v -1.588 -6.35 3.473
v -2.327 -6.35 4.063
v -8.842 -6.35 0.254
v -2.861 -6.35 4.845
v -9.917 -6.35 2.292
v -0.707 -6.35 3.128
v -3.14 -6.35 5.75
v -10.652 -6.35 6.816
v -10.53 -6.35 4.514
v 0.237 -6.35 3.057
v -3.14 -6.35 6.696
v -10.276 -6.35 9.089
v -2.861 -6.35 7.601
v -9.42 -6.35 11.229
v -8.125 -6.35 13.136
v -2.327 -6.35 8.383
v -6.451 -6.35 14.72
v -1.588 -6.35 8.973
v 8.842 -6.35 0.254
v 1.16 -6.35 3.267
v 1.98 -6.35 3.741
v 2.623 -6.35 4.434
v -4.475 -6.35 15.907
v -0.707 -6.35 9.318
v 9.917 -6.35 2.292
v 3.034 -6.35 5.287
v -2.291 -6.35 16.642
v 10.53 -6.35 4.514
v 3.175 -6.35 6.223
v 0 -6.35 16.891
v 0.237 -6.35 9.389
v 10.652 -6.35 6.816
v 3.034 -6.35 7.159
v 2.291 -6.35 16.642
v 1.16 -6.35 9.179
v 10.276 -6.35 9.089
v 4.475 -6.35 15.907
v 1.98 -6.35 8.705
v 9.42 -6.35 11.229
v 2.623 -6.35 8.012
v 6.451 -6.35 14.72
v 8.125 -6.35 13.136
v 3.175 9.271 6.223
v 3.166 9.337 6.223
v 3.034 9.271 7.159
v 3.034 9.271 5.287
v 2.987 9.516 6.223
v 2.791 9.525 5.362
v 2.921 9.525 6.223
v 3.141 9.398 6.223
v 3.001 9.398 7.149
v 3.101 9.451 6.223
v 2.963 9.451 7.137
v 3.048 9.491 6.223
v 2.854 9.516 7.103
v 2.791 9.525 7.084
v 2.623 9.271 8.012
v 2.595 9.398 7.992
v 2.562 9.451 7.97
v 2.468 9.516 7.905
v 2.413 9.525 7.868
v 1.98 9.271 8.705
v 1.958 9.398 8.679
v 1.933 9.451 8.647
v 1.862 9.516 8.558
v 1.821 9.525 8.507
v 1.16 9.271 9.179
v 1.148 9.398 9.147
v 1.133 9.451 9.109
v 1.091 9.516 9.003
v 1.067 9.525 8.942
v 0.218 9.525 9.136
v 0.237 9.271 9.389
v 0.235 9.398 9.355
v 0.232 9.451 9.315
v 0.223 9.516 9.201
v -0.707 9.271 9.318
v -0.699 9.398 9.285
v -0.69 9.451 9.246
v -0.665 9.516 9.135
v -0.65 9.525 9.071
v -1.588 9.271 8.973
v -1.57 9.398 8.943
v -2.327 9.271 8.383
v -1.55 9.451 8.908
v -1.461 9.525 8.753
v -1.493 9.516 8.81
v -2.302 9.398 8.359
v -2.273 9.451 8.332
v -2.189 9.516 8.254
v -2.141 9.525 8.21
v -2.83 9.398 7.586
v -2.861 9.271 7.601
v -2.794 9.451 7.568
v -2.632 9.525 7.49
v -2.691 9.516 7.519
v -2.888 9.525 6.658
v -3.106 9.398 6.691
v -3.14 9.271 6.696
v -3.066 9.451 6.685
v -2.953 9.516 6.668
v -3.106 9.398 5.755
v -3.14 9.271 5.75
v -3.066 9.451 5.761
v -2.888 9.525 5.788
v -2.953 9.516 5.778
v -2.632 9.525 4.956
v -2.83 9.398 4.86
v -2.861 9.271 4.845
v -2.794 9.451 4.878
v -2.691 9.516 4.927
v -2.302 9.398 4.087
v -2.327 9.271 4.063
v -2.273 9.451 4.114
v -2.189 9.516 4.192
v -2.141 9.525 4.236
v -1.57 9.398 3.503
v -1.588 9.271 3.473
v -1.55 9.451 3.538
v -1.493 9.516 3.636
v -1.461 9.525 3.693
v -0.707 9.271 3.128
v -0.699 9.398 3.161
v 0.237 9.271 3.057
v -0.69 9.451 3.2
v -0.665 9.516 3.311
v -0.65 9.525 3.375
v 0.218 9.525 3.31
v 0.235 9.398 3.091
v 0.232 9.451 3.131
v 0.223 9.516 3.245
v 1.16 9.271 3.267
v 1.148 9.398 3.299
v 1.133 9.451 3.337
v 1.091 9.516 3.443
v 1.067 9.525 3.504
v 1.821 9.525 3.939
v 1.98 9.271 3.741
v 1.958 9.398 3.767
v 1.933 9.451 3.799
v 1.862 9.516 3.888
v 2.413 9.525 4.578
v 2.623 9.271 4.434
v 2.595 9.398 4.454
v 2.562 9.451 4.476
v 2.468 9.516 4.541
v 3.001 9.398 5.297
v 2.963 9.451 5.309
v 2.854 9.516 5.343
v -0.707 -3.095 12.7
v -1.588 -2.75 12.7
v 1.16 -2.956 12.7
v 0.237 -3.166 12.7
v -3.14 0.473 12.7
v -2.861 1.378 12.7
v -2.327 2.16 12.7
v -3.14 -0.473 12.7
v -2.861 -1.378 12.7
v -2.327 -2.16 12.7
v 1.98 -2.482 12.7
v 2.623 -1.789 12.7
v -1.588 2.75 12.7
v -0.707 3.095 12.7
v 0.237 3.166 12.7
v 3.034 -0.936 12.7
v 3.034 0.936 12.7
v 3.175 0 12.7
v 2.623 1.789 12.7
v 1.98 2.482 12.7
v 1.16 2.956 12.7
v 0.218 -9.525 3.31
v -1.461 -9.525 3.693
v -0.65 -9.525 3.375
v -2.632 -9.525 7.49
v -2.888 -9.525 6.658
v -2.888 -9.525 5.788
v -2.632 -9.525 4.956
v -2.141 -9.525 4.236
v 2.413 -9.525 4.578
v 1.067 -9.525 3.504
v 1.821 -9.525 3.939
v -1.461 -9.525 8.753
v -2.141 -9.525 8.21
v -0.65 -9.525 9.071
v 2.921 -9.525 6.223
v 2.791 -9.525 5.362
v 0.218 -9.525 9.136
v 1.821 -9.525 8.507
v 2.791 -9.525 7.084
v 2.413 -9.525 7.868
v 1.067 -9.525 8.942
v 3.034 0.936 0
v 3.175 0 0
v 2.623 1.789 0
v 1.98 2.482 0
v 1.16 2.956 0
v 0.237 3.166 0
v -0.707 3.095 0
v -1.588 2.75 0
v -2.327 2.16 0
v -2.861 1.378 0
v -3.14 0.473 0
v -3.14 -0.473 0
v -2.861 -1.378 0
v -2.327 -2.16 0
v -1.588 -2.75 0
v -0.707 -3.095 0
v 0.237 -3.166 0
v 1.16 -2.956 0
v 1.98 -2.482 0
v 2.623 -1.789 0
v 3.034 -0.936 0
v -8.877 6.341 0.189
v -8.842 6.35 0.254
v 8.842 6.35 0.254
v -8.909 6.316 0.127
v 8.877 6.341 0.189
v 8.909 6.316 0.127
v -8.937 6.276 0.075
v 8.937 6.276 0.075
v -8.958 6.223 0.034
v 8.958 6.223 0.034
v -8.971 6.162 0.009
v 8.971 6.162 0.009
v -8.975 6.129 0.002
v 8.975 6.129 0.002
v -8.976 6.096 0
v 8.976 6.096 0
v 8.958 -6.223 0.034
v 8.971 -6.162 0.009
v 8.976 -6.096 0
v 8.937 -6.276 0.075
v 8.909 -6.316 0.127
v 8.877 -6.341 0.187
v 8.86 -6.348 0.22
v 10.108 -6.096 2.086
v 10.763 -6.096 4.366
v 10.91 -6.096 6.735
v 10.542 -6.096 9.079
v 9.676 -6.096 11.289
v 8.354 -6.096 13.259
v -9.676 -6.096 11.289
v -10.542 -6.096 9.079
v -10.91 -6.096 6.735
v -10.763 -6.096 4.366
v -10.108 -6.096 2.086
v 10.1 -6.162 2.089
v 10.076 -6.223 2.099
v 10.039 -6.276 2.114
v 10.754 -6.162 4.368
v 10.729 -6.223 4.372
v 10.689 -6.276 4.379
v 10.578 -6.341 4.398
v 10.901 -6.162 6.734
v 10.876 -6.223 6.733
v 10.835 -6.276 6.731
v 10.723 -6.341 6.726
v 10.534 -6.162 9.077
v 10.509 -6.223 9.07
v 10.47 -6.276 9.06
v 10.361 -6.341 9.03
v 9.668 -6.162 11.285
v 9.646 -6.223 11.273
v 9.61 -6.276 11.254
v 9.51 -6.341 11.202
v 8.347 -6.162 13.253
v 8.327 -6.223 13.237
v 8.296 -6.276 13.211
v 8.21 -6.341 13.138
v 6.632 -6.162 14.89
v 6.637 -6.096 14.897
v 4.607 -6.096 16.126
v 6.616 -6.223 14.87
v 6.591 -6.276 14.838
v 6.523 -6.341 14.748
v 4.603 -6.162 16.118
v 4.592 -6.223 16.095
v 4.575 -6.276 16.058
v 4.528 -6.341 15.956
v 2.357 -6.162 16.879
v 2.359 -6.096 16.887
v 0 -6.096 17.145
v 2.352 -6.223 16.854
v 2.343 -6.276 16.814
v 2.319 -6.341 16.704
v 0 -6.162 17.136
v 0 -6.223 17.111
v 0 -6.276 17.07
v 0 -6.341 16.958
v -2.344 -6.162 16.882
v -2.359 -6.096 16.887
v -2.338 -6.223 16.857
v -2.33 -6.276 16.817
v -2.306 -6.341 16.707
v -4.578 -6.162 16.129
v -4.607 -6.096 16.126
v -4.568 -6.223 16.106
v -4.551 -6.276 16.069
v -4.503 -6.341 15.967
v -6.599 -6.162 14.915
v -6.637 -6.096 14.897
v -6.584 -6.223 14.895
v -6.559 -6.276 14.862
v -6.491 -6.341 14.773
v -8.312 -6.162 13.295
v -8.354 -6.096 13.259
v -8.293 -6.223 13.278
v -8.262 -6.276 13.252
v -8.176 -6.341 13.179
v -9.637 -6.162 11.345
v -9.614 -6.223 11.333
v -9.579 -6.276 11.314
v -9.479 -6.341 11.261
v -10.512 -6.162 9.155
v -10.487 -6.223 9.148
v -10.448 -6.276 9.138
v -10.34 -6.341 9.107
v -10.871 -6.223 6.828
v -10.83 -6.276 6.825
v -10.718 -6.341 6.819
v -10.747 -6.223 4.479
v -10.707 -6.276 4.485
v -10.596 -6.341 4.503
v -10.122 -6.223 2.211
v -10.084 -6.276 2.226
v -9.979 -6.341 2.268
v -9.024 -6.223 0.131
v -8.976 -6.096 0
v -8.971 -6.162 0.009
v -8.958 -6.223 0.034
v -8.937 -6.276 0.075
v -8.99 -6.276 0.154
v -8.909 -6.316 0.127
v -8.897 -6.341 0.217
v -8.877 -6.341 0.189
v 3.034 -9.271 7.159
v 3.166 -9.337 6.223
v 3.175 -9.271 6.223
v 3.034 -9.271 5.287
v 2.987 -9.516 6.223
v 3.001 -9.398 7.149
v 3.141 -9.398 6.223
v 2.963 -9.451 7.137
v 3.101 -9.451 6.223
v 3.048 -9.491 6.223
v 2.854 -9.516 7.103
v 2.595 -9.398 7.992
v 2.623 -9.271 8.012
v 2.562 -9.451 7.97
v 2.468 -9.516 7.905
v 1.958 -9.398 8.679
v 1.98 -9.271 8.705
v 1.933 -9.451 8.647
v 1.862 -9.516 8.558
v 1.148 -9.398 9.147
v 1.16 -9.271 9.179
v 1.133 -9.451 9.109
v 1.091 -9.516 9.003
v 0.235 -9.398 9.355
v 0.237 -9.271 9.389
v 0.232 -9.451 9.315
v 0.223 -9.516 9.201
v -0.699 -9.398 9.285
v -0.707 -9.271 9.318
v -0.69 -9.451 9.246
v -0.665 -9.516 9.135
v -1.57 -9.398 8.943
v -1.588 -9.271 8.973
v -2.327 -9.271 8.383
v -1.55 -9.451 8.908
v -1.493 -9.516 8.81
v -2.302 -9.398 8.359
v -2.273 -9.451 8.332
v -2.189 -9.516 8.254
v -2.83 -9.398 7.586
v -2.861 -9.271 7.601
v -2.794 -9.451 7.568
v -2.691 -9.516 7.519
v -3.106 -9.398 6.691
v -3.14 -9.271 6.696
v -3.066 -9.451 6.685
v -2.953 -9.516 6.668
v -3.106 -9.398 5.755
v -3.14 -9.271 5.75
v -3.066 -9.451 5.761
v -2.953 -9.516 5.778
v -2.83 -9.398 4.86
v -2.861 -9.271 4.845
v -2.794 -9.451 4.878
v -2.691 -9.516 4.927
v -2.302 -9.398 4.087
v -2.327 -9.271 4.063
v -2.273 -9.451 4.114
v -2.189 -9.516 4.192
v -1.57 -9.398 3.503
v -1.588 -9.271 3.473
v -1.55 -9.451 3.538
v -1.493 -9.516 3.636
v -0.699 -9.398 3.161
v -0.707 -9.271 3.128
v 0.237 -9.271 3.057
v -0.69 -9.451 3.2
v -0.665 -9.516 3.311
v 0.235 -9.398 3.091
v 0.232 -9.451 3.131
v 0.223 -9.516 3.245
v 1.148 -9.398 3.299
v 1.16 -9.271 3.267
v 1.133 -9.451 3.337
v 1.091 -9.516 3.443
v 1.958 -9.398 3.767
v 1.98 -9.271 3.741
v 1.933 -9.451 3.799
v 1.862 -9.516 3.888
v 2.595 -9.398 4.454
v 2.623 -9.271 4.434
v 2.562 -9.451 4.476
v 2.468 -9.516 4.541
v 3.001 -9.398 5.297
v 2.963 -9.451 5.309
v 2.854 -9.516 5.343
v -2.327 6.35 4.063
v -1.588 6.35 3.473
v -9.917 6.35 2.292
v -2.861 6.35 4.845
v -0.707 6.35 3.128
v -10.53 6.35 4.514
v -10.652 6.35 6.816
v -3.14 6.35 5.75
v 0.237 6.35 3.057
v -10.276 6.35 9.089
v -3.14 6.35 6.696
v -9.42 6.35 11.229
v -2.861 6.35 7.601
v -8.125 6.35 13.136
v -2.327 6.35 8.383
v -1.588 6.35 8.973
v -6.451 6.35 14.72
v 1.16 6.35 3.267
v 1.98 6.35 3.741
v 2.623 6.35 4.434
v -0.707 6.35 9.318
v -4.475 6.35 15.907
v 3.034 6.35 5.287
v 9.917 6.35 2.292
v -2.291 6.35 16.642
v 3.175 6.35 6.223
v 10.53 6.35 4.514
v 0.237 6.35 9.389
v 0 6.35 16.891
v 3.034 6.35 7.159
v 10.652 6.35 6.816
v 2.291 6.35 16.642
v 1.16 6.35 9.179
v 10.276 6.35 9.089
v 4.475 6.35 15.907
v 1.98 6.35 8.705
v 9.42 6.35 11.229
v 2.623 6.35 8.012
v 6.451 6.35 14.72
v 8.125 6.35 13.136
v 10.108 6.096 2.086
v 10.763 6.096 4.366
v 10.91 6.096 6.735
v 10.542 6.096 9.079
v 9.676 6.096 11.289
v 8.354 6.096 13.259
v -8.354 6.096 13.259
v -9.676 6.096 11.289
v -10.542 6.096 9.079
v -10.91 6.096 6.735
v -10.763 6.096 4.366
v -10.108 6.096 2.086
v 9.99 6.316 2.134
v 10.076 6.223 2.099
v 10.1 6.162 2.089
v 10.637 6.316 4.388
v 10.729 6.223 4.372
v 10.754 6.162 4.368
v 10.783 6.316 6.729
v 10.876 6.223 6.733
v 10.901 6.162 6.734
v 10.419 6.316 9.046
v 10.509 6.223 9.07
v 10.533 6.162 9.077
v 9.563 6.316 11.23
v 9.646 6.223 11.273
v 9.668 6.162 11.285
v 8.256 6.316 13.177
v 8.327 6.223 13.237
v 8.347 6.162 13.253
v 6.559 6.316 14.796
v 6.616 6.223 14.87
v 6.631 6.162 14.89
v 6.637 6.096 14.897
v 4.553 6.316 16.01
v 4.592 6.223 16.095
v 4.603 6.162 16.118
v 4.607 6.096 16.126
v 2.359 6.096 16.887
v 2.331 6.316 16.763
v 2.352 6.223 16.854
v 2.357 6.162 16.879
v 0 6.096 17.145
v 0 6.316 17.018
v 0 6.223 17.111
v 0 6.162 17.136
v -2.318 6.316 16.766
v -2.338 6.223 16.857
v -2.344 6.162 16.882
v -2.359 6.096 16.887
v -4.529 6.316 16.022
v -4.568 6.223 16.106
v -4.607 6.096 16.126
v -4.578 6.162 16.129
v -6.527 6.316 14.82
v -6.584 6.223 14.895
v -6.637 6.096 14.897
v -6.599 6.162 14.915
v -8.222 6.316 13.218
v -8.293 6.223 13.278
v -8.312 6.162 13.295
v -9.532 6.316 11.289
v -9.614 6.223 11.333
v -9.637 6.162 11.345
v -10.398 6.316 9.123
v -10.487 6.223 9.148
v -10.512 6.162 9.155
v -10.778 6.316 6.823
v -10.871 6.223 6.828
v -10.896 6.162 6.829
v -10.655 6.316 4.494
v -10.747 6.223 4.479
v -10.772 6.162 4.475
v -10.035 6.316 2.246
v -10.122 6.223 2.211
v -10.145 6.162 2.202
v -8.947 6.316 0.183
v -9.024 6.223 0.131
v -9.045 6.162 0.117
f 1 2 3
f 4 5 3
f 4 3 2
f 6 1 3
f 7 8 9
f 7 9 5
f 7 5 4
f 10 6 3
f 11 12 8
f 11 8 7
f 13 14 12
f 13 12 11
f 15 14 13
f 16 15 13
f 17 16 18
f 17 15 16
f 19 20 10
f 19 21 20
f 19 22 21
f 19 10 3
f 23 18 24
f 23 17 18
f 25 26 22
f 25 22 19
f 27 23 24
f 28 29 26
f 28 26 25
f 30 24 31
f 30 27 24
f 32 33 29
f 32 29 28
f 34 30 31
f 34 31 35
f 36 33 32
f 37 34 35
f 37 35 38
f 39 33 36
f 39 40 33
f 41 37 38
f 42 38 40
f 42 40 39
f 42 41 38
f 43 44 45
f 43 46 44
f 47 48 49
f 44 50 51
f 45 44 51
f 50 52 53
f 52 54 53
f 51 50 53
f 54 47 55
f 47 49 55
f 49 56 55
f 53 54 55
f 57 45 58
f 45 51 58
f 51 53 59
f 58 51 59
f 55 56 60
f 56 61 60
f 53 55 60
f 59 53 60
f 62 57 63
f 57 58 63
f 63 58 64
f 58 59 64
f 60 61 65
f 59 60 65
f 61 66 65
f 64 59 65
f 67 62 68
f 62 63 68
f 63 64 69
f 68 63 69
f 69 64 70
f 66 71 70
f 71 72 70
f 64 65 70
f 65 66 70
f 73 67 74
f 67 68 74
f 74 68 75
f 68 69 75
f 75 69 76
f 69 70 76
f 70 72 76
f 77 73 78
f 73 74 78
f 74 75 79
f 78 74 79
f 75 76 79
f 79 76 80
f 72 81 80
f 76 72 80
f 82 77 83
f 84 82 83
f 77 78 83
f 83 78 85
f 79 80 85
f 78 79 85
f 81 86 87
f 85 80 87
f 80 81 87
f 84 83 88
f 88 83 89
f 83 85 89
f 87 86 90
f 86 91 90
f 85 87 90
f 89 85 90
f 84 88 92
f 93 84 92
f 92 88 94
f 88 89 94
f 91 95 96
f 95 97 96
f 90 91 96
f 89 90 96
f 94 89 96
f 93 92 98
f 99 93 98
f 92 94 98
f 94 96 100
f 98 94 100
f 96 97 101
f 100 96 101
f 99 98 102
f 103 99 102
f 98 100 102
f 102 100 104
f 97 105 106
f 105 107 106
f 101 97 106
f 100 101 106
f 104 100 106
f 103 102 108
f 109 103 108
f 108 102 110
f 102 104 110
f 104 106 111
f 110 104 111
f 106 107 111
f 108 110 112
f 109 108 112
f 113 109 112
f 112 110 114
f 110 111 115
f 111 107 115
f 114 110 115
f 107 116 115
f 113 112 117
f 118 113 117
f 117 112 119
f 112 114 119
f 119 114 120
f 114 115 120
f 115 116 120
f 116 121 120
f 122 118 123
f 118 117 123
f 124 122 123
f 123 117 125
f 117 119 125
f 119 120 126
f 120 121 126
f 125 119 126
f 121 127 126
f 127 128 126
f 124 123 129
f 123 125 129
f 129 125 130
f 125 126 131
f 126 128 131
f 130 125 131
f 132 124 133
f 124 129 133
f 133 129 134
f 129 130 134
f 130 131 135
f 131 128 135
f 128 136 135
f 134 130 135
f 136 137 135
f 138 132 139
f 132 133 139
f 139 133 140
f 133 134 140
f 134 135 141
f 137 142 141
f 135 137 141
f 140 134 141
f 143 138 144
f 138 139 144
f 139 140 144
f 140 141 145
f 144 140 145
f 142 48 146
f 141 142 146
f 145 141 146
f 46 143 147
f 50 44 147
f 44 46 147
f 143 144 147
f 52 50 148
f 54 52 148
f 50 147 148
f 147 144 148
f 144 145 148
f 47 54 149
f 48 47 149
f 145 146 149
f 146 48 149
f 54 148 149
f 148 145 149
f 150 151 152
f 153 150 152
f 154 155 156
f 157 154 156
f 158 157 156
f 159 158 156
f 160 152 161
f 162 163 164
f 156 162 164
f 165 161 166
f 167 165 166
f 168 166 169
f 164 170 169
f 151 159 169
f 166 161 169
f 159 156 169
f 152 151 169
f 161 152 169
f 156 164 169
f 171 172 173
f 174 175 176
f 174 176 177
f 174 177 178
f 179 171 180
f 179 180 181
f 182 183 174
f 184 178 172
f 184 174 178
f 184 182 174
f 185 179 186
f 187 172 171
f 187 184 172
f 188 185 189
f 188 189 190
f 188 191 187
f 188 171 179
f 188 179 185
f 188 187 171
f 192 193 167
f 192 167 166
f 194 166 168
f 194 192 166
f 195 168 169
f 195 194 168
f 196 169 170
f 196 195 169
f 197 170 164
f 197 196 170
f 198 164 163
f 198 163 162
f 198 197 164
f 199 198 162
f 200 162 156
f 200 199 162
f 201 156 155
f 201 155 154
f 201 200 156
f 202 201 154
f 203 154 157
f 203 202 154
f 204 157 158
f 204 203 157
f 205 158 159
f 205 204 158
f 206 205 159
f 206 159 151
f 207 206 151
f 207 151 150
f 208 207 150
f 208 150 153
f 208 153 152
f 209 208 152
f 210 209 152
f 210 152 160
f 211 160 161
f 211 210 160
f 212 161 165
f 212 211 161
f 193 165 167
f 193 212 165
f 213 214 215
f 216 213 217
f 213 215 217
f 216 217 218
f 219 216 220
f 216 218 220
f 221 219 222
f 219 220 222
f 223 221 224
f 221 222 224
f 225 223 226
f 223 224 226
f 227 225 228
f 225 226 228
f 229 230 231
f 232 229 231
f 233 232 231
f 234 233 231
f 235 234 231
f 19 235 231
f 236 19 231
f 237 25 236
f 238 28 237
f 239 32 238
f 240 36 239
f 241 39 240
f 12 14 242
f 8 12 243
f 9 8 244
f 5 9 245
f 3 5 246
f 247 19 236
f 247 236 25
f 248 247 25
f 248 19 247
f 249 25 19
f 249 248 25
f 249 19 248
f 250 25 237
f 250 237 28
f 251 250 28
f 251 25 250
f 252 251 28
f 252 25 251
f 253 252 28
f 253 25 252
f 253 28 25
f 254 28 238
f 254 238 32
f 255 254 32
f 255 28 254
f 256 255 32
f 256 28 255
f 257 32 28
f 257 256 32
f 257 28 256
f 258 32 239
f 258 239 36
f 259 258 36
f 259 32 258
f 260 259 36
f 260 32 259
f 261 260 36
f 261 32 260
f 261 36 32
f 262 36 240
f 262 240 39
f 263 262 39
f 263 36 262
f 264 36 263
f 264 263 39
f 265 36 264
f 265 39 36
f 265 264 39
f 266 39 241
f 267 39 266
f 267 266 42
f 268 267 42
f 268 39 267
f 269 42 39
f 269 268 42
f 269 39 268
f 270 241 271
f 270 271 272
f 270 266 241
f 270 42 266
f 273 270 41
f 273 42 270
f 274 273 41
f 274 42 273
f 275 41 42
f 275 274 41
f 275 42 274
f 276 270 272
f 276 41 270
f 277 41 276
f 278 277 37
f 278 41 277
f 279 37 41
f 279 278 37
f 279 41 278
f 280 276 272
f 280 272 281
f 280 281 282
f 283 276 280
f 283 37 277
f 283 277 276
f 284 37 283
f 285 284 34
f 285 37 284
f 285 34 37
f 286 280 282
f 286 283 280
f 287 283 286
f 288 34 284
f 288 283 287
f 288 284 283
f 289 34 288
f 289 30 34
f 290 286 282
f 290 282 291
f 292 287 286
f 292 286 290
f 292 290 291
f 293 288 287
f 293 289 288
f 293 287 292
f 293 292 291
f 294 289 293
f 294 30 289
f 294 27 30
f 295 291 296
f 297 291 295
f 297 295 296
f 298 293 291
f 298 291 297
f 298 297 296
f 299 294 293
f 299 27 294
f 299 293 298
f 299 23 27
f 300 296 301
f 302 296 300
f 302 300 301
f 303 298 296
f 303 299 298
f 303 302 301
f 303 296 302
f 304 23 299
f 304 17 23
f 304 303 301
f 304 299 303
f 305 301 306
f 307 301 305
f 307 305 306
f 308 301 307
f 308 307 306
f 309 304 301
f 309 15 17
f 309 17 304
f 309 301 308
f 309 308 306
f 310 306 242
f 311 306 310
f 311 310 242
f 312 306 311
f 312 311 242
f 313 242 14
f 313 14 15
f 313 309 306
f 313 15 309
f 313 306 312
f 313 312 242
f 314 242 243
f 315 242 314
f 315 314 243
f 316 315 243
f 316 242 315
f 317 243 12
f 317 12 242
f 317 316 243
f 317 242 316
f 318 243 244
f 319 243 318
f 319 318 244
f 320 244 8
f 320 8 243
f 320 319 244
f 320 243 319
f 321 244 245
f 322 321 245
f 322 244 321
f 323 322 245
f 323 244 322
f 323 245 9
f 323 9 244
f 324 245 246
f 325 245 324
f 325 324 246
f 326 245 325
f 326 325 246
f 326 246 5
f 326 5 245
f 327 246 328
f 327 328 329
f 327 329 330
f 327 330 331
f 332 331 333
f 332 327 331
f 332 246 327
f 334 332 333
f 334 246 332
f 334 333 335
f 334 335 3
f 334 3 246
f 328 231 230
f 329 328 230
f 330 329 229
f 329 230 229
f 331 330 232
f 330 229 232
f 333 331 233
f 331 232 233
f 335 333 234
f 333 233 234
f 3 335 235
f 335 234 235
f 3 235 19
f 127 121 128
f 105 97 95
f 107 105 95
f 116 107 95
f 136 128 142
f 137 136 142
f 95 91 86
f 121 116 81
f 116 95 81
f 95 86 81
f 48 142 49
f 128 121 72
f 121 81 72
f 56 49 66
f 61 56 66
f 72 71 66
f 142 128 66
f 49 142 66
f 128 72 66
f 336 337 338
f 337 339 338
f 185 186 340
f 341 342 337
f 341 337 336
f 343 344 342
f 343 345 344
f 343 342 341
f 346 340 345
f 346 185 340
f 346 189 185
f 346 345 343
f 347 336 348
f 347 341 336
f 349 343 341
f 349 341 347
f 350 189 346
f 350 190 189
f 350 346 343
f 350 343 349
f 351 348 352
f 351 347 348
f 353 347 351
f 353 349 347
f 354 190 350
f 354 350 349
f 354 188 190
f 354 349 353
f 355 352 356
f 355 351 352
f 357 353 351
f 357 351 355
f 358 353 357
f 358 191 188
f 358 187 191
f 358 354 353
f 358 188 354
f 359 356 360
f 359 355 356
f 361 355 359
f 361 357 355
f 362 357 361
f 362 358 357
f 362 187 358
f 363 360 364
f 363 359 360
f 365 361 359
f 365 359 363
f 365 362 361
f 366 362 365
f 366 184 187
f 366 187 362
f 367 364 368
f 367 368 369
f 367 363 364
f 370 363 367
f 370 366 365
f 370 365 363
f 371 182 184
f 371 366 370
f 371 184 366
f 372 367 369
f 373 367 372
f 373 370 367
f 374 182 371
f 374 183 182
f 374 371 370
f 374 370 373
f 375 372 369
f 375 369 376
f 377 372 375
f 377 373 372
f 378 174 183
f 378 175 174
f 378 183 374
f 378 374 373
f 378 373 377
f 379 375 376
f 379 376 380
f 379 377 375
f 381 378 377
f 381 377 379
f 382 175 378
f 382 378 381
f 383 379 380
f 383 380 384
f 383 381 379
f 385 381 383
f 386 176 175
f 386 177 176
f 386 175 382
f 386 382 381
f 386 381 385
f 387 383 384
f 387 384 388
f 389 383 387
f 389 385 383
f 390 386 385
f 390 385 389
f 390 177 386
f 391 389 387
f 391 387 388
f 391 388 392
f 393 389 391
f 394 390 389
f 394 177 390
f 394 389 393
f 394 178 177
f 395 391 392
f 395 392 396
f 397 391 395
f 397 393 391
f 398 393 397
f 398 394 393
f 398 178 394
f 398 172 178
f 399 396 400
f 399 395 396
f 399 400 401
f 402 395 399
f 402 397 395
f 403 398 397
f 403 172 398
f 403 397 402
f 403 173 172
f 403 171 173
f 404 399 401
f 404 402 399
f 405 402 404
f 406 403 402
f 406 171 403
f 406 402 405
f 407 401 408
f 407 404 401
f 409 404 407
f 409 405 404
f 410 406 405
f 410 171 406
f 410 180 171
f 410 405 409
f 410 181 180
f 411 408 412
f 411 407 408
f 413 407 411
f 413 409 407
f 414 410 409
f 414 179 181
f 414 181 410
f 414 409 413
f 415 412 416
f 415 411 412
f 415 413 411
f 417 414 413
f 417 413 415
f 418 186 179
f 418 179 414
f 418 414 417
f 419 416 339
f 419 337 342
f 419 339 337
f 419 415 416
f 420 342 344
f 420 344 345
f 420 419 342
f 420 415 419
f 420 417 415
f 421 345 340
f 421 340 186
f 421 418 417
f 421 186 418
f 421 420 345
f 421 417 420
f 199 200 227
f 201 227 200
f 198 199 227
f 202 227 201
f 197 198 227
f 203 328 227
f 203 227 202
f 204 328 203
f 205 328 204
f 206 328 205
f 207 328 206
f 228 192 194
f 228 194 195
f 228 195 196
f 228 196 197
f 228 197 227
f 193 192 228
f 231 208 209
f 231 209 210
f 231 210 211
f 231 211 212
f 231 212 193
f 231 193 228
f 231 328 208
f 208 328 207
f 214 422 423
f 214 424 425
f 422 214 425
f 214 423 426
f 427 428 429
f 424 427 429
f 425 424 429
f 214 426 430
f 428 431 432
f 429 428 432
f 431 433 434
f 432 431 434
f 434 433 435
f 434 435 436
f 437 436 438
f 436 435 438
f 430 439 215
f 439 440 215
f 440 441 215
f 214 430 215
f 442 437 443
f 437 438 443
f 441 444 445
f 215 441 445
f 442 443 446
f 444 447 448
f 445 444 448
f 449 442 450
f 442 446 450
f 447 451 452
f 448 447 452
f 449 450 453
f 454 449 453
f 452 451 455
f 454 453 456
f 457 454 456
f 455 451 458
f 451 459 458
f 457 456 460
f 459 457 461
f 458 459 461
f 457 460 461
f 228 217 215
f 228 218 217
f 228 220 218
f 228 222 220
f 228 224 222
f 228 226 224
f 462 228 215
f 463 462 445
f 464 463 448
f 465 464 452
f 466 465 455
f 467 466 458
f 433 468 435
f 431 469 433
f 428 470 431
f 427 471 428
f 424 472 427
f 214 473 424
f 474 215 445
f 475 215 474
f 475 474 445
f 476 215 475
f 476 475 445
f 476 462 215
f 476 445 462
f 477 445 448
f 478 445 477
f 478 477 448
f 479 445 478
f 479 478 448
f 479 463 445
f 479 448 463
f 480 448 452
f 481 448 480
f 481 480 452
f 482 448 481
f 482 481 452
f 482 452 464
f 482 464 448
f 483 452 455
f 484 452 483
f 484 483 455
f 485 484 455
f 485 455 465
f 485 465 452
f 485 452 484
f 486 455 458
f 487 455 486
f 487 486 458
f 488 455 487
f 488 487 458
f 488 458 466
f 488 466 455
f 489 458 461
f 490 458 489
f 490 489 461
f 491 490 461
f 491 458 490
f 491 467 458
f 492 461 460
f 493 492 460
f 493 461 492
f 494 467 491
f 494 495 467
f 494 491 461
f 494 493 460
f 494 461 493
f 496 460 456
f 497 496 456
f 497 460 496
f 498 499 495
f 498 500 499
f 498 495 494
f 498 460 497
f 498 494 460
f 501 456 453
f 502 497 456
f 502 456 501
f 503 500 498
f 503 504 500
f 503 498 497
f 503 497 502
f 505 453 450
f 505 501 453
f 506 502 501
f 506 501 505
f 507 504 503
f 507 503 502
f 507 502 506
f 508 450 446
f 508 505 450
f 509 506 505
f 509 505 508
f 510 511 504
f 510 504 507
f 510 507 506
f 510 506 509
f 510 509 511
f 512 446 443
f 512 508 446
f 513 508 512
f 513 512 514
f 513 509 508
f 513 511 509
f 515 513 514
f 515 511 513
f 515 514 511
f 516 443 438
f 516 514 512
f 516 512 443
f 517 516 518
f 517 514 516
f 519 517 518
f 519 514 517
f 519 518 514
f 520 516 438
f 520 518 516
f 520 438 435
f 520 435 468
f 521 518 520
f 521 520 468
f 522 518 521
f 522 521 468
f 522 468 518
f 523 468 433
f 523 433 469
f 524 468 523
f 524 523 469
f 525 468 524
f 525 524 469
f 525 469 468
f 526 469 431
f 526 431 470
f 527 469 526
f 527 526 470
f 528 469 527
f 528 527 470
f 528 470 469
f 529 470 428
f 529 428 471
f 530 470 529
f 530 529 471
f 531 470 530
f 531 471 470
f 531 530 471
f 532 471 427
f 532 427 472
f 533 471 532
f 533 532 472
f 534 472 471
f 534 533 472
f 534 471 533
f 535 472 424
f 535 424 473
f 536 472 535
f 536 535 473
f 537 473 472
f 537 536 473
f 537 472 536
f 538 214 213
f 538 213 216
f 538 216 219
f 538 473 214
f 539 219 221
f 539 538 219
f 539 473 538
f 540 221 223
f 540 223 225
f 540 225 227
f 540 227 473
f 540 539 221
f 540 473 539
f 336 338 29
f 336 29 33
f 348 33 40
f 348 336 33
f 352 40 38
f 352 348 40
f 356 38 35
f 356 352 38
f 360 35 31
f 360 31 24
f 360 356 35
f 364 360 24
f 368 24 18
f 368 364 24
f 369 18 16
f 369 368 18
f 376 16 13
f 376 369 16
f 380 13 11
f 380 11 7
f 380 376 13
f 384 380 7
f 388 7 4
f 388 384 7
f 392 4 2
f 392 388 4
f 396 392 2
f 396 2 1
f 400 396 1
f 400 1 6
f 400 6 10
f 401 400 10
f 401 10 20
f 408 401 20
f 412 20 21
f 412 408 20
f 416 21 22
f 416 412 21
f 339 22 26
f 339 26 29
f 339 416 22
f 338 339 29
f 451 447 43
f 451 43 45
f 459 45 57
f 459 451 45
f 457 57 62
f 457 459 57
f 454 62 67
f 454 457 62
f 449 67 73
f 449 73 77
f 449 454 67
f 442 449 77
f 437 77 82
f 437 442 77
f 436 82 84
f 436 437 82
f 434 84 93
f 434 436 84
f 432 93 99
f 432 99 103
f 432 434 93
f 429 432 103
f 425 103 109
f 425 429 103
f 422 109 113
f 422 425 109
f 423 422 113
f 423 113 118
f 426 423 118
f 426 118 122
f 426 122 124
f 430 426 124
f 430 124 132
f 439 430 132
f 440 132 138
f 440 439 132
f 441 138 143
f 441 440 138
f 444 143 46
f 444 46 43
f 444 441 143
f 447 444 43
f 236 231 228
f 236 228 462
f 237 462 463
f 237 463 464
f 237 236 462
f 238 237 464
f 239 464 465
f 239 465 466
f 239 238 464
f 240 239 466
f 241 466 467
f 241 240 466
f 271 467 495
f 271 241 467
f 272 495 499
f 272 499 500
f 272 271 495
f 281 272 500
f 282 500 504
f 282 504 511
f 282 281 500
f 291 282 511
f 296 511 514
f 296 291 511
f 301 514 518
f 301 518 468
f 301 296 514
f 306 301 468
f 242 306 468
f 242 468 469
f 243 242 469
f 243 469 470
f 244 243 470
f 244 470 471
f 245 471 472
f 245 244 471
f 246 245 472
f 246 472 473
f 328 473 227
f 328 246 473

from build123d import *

# Parameters (mm, degrees)
F3_DEPTH = 6.35
F1_R     = 3.175
F4_DEPTH = 9.525
F2_R     = 3.175
F5_DEPTH = 12.7
F6_R     = 0.254


with BuildPart() as f3:
    # F0 (on Front) → F3 (new body, symmetric)
    with BuildSketch(Plane.XZ):
        with BuildLine():
            Line((-8.975765, 0), (8.975765, 0))
            ThreePointArc((8.975765, 0), (0, 17.145), (-8.975765, 0))
        make_face()
    extrude(amount=F3_DEPTH, both=True)

    # F1 (on Front) → F4 (join, symmetric)
    with BuildSketch(Plane.XZ):
        with Locations((0, 6.223)):
            Circle(F1_R)
    extrude(amount=F4_DEPTH, both=True)

    # F2 (on Top) → F5 (cut)
    with BuildSketch(Plane.XY):
        Circle(F2_R)
    extrude(amount=F5_DEPTH, mode=Mode.SUBTRACT)

    # F6
    f6_edges = [f3.edges().sort_by_distance(p)[0] for p in [
        (-3.175, -9.525, 6.223),
        (0, -6.35, 17.145),
        (0, 6.35, 17.145),
        (-3.175, 9.525, 6.223),
        (0, 6.35, 0),
        (0, -6.35, 0),
    ]]
    fillet(f6_edges, radius=F6_R)


solid = f3.part
